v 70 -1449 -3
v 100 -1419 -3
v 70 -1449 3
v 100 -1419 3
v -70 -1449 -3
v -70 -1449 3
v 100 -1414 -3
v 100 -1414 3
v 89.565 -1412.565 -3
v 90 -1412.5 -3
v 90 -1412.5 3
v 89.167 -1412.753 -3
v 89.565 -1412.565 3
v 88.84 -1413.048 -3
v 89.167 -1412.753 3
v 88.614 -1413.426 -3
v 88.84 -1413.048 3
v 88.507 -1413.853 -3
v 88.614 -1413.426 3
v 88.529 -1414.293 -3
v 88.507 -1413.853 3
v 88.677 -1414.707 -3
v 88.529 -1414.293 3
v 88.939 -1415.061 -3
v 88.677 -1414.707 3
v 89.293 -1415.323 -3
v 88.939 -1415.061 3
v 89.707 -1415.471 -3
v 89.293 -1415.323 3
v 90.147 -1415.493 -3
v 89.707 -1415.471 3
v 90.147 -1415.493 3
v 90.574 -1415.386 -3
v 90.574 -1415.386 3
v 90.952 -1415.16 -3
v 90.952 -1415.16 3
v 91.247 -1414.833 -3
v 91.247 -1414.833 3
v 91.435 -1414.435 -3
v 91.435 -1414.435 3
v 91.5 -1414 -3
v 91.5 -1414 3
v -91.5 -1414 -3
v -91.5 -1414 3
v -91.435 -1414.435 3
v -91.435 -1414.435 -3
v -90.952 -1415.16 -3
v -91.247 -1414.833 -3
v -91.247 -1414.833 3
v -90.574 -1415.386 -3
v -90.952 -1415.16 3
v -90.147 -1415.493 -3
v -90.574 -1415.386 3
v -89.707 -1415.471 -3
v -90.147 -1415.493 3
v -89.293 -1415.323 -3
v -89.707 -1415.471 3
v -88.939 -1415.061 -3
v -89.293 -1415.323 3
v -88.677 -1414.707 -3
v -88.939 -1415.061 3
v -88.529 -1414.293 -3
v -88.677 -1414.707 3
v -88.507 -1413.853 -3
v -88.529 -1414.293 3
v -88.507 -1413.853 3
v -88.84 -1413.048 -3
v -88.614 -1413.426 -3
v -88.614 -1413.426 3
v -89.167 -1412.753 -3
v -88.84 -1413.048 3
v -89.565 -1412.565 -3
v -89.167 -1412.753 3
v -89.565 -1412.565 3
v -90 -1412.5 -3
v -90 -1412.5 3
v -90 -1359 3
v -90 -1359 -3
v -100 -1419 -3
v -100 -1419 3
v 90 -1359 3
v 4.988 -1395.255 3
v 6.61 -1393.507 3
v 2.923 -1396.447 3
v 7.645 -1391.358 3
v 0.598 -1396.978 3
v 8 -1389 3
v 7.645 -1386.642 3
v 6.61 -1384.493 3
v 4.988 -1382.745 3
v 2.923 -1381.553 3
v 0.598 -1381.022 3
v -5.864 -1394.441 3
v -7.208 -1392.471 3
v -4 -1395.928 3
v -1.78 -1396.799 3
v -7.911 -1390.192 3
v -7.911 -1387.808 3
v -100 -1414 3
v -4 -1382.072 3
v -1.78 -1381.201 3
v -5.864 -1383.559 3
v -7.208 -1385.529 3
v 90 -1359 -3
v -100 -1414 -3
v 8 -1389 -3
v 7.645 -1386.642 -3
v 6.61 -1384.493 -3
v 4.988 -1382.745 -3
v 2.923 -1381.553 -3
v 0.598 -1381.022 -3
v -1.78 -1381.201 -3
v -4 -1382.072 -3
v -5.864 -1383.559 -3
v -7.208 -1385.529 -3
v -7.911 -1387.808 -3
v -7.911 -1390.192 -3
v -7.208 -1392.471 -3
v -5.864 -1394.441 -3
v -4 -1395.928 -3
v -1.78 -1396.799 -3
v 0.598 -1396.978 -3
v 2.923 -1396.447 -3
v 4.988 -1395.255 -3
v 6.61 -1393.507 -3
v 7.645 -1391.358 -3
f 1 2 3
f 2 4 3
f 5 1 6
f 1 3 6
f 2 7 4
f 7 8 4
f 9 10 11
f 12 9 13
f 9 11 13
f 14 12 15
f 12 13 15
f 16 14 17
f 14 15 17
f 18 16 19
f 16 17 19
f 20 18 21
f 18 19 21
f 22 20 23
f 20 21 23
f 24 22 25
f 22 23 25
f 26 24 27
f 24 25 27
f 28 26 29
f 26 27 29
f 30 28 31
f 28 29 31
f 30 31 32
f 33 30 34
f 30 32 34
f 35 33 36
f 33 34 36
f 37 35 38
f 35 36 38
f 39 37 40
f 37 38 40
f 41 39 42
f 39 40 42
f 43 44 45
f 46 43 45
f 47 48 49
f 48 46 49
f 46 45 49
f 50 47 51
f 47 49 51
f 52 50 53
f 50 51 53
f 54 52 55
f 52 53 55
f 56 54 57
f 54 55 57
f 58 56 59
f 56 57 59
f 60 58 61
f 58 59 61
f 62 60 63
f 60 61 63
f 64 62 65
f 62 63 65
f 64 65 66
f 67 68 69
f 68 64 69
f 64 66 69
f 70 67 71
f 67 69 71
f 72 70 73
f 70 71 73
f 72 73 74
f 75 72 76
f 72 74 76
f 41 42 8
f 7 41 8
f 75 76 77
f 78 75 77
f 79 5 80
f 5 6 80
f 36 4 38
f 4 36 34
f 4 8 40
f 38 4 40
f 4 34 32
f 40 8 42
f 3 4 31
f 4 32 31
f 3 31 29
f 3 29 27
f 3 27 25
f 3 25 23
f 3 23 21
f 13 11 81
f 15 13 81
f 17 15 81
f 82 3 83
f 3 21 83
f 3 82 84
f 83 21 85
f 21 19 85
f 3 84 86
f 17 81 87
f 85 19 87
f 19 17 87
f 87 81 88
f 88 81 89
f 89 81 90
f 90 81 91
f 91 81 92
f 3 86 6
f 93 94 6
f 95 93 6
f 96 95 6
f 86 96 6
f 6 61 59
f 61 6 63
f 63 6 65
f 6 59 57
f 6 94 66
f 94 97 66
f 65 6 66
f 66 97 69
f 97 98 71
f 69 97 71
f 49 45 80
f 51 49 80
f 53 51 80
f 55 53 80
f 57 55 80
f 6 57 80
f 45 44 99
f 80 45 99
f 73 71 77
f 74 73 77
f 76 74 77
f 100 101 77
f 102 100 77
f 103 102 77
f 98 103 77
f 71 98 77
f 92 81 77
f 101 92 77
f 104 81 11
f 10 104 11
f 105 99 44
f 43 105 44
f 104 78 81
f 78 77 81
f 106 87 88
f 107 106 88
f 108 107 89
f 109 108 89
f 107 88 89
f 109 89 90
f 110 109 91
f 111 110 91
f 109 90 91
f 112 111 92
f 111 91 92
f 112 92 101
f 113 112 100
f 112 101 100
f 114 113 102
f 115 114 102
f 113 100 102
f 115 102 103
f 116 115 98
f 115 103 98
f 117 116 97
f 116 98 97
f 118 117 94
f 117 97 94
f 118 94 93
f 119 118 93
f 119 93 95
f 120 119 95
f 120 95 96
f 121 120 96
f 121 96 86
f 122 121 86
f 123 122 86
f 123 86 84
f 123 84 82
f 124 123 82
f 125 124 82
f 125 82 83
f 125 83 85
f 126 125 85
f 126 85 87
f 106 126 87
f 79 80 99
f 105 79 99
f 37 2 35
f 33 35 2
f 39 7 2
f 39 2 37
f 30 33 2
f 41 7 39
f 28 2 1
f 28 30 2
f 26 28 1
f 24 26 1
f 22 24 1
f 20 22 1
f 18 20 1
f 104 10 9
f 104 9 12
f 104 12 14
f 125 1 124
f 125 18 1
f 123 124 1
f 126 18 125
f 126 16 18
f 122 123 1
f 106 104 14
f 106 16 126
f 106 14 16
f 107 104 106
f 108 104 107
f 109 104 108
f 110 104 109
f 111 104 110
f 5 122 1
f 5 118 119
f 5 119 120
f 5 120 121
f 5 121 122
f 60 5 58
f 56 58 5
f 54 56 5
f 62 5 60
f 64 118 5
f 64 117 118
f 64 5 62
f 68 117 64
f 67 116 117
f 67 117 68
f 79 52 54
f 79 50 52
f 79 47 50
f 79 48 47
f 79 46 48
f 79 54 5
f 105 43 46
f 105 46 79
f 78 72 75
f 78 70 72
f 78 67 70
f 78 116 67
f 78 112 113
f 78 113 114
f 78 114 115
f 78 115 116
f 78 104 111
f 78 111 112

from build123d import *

# Parameters (mm, degrees)
BOSS_EXTRUDE1_DEPTH      = 3
BOSS_EXTRUDE1_DEPTH_BACK = 3
SKETCH2_R                = 8
CUT_EXTRUDE1_DEPTH       = 1
CUT_EXTRUDE1_DEPTH_BACK  = 7
SKETCH3_R                = 1.5
CUT_EXTRUDE2_DEPTH       = 1
CUT_EXTRUDE2_DEPTH_BACK  = 7


with BuildPart() as part:
    # Sketch1 → Boss-Extrude1 (new body, two sides)
    with BuildSketch(Plane.XY) as boss_extrude1_sk:
        Polygon((-90, -1414.000005922), (-90, -1359.000005922), (90, -1359.000005922), (90, -1414.000005922), (100, -1414.000005922), (100, -1419.000005922), (70, -1449.000005922), (-70, -1449.000005922), (-100, -1419.000005922), (-100, -1414.000005922), align=None)
    extrude(amount=BOSS_EXTRUDE1_DEPTH)
    extrude(boss_extrude1_sk.sketch, amount=-BOSS_EXTRUDE1_DEPTH_BACK)

    # Sketch2 → Cut-Extrude1 (cut, two sides)
    with BuildSketch(Plane.XY.offset(3)) as cut_extrude1_sk:
        with Locations((0, -1389.000005922)):
            Circle(SKETCH2_R)
    extrude(amount=CUT_EXTRUDE1_DEPTH, mode=Mode.SUBTRACT)
    extrude(cut_extrude1_sk.sketch, amount=-CUT_EXTRUDE1_DEPTH_BACK, mode=Mode.SUBTRACT)

    # Sketch3 → Cut-Extrude2 (cut, two sides)
    with BuildSketch(Plane.XY.offset(3)) as cut_extrude2_sk:
        with Locations((-90, -1414.000005922)):
            Circle(SKETCH3_R)
        with Locations((90, -1414.000005922)):
            Circle(SKETCH3_R)
    extrude(amount=CUT_EXTRUDE2_DEPTH, mode=Mode.SUBTRACT)
    extrude(cut_extrude2_sk.sketch, amount=-CUT_EXTRUDE2_DEPTH_BACK, mode=Mode.SUBTRACT)


solid = part.part
